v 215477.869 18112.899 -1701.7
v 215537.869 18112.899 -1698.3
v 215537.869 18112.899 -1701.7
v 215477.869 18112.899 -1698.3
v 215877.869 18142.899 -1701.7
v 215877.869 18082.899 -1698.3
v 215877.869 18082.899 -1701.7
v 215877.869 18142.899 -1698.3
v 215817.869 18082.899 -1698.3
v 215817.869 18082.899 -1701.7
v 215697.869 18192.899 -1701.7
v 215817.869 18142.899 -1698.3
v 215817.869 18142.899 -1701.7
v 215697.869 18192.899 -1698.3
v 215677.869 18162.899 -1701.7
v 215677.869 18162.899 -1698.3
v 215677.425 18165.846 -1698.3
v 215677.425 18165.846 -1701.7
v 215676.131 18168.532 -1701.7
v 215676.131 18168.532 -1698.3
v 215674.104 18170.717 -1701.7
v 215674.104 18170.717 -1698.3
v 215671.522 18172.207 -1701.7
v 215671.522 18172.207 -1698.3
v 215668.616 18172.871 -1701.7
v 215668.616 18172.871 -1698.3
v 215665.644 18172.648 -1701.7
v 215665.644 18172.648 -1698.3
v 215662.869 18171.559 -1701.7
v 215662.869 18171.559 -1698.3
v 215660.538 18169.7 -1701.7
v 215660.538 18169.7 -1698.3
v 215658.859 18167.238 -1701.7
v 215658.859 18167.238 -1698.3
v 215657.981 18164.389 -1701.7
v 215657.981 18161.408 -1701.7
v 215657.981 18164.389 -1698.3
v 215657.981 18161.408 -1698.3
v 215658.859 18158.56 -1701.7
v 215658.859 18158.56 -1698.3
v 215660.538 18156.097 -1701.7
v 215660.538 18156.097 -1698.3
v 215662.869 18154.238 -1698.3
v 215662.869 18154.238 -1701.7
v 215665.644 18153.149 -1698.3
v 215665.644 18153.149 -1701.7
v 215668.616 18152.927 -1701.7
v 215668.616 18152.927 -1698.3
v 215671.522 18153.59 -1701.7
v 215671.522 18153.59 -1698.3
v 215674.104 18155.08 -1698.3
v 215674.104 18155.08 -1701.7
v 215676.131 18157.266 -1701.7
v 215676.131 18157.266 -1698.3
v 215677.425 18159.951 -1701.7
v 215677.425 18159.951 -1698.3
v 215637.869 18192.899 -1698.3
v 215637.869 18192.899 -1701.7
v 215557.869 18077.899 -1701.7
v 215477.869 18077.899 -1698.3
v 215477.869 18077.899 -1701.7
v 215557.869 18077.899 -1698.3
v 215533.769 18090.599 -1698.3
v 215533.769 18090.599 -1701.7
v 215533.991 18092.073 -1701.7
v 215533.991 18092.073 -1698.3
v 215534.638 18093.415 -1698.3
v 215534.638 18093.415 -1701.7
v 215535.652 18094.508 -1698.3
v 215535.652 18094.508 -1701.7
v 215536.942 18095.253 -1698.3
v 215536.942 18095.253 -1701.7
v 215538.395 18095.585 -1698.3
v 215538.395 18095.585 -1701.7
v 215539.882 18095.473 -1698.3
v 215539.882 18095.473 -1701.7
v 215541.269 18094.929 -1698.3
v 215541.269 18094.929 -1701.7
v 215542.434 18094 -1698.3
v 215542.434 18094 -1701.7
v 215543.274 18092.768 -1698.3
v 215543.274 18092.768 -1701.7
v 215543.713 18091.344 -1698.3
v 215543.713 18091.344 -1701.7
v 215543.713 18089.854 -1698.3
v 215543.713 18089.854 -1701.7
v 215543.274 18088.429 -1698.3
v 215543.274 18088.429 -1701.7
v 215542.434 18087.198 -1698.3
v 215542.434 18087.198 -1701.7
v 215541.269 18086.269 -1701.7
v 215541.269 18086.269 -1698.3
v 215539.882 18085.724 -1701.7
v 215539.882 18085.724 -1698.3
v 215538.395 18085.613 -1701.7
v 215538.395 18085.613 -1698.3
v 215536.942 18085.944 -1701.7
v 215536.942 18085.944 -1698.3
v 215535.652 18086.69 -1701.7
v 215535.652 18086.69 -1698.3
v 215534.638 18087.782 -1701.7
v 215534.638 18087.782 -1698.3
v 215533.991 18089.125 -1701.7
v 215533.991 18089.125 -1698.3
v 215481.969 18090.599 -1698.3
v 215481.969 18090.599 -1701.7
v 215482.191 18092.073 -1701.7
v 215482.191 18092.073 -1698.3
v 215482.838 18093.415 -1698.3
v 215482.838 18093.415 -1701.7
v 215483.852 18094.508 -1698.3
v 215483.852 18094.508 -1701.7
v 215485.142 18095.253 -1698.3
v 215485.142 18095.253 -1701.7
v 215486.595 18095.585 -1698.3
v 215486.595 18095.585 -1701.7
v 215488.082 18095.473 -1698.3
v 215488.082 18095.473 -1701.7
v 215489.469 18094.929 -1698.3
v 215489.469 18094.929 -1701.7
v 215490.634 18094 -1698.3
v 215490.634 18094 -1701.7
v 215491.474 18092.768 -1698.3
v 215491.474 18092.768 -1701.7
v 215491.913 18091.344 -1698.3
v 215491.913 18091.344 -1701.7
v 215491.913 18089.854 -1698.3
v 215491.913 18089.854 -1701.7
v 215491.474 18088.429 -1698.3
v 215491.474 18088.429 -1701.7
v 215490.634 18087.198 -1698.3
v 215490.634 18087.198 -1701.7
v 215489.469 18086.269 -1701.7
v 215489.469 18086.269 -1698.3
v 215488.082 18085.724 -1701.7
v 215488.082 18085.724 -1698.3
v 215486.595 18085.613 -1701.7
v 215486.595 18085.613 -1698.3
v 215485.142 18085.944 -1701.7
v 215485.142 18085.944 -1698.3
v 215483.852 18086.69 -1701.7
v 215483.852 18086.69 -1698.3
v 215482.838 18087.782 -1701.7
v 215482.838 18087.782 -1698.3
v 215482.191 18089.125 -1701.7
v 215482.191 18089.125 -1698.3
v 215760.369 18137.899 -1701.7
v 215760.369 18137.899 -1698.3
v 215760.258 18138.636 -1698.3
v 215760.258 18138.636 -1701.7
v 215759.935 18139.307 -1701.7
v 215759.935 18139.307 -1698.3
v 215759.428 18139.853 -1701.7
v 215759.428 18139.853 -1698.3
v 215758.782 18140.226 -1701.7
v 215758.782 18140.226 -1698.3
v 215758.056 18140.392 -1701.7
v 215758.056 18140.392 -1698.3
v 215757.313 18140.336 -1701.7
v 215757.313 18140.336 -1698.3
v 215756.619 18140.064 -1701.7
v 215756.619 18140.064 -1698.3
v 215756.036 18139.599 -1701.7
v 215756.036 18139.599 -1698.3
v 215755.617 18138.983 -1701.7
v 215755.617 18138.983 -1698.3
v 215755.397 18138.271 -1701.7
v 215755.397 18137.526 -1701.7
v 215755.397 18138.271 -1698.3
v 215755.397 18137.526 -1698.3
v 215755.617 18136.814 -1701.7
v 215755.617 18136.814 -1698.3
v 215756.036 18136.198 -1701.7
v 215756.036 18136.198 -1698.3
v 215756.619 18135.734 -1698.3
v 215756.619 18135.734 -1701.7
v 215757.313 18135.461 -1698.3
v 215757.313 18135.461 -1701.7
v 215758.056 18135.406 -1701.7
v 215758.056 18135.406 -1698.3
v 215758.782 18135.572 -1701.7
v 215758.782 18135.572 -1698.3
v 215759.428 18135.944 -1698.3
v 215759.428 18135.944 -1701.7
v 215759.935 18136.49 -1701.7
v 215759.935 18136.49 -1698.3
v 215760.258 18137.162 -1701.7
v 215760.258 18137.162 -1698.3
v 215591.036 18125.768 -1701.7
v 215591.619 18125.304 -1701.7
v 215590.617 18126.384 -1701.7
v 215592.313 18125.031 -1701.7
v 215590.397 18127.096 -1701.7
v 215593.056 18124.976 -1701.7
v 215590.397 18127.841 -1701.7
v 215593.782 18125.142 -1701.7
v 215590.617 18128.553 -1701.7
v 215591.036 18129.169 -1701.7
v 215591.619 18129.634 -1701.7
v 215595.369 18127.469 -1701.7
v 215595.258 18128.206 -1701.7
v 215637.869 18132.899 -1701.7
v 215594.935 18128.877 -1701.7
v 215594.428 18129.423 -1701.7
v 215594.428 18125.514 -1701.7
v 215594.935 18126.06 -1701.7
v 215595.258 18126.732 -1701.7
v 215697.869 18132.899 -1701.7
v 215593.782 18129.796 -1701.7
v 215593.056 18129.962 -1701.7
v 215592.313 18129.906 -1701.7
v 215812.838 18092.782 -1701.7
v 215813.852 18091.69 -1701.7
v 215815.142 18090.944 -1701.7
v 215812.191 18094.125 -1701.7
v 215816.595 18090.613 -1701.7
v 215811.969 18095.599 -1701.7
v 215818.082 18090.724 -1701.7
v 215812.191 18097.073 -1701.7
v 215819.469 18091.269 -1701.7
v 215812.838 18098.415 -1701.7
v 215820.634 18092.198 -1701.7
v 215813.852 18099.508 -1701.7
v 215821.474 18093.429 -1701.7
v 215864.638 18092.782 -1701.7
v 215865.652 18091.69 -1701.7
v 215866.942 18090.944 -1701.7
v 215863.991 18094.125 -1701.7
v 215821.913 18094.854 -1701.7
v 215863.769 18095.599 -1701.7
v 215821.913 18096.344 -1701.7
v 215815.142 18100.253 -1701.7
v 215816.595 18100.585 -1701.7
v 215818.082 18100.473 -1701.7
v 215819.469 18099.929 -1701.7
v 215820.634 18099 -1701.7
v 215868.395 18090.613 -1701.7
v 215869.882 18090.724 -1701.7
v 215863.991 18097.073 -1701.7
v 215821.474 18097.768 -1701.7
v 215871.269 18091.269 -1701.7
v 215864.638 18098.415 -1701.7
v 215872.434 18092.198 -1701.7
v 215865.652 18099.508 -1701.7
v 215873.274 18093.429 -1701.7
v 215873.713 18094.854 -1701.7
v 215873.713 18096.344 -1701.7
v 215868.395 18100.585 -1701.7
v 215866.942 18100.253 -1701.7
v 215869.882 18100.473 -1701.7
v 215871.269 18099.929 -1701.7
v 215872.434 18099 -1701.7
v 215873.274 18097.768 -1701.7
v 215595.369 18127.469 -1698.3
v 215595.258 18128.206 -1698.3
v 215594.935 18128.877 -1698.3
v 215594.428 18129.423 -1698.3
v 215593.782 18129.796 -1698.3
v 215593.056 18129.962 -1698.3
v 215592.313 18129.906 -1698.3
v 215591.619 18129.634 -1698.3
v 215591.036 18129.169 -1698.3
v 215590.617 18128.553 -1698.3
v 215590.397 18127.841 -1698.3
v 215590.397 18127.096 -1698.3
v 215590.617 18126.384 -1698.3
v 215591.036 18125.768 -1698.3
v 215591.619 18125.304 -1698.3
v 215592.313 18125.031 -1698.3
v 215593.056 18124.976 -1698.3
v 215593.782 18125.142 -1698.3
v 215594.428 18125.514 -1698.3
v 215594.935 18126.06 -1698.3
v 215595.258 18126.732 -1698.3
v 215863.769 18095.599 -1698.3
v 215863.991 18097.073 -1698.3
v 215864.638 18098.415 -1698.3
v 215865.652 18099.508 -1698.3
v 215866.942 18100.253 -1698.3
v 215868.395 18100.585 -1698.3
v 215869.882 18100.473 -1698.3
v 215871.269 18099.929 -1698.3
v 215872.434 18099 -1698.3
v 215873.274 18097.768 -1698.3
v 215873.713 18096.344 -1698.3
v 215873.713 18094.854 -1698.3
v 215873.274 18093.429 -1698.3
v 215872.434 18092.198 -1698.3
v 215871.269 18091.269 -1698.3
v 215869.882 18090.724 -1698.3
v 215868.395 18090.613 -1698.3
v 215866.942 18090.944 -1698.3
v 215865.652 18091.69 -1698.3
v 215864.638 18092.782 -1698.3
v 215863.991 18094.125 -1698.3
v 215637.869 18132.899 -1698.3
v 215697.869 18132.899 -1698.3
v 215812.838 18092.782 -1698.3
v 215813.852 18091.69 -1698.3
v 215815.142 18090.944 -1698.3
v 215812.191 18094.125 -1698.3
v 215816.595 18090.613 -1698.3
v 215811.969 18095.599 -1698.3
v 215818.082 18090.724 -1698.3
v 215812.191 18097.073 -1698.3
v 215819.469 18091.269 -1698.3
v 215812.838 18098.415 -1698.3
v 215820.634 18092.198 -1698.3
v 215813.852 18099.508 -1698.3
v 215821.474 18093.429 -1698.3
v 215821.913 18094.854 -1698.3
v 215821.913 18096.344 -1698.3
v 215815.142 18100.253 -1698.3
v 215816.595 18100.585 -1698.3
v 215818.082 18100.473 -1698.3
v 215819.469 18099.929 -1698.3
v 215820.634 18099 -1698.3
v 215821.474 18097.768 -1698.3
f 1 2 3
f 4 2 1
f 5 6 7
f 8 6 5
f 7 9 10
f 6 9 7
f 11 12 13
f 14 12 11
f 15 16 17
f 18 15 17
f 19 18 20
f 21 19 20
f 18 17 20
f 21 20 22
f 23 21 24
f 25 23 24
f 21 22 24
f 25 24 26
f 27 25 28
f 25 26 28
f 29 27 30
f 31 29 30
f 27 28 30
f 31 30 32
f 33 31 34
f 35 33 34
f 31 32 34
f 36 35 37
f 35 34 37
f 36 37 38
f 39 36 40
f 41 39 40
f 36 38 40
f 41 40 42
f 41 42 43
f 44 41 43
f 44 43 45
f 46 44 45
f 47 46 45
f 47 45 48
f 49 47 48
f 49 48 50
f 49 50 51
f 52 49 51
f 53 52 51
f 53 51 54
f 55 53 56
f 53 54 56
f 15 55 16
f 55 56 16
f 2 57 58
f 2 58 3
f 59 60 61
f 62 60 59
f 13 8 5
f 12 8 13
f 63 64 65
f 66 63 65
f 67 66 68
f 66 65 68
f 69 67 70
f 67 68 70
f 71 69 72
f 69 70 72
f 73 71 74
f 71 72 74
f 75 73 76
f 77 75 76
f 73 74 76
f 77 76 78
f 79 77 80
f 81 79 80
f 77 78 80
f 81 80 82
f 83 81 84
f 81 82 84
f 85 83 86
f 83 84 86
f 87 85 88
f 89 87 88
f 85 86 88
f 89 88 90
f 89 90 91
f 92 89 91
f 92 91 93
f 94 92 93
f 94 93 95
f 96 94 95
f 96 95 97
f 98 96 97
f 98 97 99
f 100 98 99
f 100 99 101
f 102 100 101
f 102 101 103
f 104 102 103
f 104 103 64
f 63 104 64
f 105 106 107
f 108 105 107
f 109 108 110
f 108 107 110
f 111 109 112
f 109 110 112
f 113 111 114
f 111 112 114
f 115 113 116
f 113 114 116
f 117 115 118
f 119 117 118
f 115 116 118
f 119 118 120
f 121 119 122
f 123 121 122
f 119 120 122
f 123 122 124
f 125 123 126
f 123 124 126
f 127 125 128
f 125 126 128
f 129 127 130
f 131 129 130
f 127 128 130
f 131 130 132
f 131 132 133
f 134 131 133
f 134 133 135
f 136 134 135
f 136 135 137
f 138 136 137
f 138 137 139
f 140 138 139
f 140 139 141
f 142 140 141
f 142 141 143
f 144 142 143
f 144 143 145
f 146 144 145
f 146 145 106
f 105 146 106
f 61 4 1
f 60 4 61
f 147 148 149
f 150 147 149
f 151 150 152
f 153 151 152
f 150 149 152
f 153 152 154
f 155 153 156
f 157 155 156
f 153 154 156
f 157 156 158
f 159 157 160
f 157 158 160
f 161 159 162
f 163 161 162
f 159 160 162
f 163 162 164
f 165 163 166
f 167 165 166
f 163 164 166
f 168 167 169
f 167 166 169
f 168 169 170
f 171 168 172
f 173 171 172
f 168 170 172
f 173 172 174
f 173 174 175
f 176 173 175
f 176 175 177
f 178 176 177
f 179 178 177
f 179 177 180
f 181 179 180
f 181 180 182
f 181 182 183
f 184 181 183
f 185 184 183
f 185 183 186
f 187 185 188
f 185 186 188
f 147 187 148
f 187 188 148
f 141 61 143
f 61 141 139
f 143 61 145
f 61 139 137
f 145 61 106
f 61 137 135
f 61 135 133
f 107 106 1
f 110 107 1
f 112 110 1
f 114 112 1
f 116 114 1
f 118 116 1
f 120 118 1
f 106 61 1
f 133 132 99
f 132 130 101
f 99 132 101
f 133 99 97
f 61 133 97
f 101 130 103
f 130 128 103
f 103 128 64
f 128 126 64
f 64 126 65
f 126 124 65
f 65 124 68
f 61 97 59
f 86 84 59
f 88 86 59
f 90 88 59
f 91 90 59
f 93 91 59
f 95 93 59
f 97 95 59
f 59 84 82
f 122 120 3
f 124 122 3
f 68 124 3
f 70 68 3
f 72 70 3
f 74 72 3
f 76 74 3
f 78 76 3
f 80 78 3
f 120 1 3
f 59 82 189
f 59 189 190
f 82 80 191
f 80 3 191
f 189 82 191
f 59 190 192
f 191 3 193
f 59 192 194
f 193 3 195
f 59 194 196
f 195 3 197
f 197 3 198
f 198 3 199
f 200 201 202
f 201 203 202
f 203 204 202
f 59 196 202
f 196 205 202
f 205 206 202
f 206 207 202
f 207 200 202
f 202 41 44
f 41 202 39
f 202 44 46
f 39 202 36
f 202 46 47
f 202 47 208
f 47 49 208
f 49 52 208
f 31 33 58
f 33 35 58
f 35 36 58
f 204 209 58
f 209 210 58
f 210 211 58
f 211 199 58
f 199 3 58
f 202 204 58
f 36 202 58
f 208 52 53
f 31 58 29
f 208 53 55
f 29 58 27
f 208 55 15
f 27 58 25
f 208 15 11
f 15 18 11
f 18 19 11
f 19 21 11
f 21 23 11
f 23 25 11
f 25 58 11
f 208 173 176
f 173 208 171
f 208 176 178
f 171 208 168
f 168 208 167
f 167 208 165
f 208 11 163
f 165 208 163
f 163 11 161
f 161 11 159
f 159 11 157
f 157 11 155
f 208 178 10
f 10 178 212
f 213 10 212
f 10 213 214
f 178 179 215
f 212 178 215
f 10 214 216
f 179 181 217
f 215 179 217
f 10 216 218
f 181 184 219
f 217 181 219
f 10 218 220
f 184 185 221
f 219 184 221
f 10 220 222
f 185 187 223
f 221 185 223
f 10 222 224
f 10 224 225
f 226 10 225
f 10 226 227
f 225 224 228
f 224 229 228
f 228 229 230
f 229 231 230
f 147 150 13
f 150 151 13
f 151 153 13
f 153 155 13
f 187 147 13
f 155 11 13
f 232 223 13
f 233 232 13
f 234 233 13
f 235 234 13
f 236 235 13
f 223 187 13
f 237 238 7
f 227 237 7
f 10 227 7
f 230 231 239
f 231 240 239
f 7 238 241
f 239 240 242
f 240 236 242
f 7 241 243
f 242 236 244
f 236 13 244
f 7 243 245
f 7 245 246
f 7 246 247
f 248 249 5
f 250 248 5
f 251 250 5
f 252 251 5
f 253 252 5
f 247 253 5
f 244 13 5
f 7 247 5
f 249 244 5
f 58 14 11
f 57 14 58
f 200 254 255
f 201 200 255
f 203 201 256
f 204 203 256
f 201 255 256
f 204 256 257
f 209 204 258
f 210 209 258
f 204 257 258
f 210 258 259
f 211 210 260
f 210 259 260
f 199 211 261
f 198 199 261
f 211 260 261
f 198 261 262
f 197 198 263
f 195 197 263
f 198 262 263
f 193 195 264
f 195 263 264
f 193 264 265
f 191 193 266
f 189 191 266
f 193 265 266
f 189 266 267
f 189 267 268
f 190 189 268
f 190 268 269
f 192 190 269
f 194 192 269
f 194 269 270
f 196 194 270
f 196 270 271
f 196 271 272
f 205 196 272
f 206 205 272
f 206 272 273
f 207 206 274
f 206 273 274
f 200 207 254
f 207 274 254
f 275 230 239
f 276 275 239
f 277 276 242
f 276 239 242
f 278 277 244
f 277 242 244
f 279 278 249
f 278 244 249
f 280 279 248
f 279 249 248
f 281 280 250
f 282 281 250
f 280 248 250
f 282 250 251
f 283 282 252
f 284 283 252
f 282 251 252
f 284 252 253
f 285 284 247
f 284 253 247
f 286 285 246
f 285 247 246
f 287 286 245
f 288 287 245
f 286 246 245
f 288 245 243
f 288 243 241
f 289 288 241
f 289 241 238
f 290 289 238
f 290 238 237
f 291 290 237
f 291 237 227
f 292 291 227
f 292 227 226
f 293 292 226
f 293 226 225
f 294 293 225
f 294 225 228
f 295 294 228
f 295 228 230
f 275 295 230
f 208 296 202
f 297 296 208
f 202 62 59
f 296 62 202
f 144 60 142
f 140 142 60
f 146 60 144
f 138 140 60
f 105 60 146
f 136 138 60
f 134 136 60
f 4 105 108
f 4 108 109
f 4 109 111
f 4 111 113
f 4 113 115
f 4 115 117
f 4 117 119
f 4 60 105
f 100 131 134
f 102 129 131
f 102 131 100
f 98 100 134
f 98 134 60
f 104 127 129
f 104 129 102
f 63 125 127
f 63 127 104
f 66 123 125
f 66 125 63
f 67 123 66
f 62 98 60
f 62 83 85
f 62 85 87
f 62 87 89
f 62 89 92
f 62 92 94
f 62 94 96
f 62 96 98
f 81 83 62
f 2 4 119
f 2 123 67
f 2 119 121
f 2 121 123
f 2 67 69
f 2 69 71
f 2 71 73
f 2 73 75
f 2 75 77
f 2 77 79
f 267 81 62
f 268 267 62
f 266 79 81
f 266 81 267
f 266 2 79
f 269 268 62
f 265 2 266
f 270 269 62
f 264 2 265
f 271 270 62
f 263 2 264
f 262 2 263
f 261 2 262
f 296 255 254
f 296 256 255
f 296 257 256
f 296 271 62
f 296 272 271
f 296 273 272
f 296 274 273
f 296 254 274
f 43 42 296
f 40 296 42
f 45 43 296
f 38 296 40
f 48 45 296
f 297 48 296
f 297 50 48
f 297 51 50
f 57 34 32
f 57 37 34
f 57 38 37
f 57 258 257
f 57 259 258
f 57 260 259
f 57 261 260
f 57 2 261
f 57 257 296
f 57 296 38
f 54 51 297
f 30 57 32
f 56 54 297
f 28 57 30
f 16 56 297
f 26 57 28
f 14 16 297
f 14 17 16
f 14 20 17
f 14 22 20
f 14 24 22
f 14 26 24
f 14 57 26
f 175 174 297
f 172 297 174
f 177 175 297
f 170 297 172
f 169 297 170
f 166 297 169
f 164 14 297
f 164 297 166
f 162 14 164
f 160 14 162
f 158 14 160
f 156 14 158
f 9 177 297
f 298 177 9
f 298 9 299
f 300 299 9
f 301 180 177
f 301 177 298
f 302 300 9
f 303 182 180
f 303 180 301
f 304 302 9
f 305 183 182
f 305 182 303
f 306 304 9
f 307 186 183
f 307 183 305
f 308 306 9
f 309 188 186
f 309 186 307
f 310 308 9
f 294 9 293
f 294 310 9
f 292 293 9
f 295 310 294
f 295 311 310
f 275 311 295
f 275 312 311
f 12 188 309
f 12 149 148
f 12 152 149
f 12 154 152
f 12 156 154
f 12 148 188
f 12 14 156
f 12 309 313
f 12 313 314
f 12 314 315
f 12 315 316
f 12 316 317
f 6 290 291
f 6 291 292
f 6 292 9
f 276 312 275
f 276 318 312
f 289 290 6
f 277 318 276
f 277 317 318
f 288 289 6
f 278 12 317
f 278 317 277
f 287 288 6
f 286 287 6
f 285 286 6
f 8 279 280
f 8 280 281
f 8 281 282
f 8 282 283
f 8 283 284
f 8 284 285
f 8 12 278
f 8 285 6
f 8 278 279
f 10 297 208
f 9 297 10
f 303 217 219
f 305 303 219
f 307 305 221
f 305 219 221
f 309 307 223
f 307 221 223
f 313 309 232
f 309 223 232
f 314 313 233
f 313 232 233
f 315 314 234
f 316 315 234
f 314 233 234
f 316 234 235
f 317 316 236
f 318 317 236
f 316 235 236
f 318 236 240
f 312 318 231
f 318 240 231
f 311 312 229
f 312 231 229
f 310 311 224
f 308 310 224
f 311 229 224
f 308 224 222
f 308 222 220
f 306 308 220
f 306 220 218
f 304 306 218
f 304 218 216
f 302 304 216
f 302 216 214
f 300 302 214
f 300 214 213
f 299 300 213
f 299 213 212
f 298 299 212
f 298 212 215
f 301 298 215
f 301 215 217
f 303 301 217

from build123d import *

# Parameters (mm, degrees)
SKETCH1_R          = 10000
SKETCH1_R_2        = 2500
BASE_FLANGE1_DEPTH = 3400
SCALE1_SCALE       = 0.001
SKETCH2_R          = 5
CUT_EXTRUDE1_DEPTH = 216644.107193969


# Sheet-metal steps are written as plain solids
with BuildPart() as part:
    # Sketch1 → Base-Flange1 (new body)
    with BuildSketch(Plane.XY):
        Polygon((0, 0), (0, -35000), (80000, -35000), (160000, 20000), (220000, 20000), (340000, -30000), (400000, -30000), (400000, 30000), (340000, 30000), (220000, 80000), (160000, 80000), (60000, 0), align=None)
        with Locations((190000, 50000)):
            Circle(SKETCH1_R, mode=Mode.SUBTRACT)
        with Locations((280000, 25000)):
            Circle(SKETCH1_R_2, mode=Mode.SUBTRACT)
        with Locations((115000, 14570.048045386)):
            Circle(SKETCH1_R_2, mode=Mode.SUBTRACT)
    extrude(amount=-BASE_FLANGE1_DEPTH)


with BuildPart() as part_1:
    # Scale1: scaled about (215693.562550425, 18131.029763925, -1700)
    add(part.part.scale(SCALE1_SCALE).moved(Location((215477.868987875, 18112.898734161, -1698.3))))

    # Sketch2 → Cut-Extrude1 (cut, through all)
    with BuildSketch(Plane(origin=(0, 0, -1701.7), x_dir=(-1, 0, 0), z_dir=(0, 0, -1))):
        with Locations((-215486.968987875, 18090.598734161)):
            Circle(SKETCH2_R)
        with Locations((-215538.768987875, 18090.598734161)):
            Circle(SKETCH2_R)
        with Locations((-215816.968987875, 18095.598734161)):
            Circle(SKETCH2_R)
        with Locations((-215868.768987875, 18095.598734161)):
            Circle(SKETCH2_R)
    extrude(amount=-CUT_EXTRUDE1_DEPTH, mode=Mode.SUBTRACT)


solid = part_1.part
